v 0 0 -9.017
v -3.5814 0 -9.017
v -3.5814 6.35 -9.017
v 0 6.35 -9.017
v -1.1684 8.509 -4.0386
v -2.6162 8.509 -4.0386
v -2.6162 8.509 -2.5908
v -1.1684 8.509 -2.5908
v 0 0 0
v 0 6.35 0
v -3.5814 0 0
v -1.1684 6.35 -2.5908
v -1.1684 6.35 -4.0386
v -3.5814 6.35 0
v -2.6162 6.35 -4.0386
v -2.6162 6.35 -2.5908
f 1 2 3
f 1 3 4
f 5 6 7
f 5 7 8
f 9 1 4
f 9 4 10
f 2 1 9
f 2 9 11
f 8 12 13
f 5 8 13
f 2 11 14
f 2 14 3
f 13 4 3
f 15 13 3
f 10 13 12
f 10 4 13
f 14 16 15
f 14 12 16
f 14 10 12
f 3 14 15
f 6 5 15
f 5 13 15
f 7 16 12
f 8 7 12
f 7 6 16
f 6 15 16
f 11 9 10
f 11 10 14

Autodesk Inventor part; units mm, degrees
ref_plane "YZ Plane" through (0, 0, 0) normal (1, 0, 0) x (0, 1, 0)
ref_plane "XZ Plane" through (0, 0, 0) normal (0, 1, 0) x (-1, 0, 0)
ref_plane "XY Plane" through (0, 0, 0) normal (0, 0, 1) x (1, 0, 0)
sketch "Sketch1" plane through (0, 0, 0) normal (0, 1, 0) x (-1, 0, 0)
  line L0 (0, 0) -> (3.5814, 0)
  line L1 (3.5814, 0) -> (3.5814, -9.017)
  line L2 (3.5814, -9.017) -> (0, -9.017)
  line L3 (0, -9.017) -> (0, 0)
  dimension "d0" = 3.5814
  dimension "d1" = 9.017
extrude "Extrusion1" add sketch "Sketch1" along normal blind 6.35
sketch "Sketch2" plane through (0, 6.35, 0) normal (0, 1, 0) x (1, 0, 0)
  line L0 (-2.6162, 2.5908) -> (-1.1684, 2.5908)
  line L1 (-1.1684, 2.5908) -> (-1.1684, 4.0386)
  line L2 (-1.1684, 4.0386) -> (-2.6162, 4.0386)
  line L3 (-2.6162, 4.0386) -> (-2.6162, 2.5908)
  line L4 (-3.5814, 0) -> (0, 0) projected
  line L5 (0, 0) -> (0, 9.017) projected
  dimension "d4" = 1.4478
  dimension "d5" = 1.4478
  dimension "d6" = 2.5908
  dimension "d7" = 1.1684
extrude "Extrusion2" add sketch "Sketch2" along normal blind 2.159
properties part number "switch"
